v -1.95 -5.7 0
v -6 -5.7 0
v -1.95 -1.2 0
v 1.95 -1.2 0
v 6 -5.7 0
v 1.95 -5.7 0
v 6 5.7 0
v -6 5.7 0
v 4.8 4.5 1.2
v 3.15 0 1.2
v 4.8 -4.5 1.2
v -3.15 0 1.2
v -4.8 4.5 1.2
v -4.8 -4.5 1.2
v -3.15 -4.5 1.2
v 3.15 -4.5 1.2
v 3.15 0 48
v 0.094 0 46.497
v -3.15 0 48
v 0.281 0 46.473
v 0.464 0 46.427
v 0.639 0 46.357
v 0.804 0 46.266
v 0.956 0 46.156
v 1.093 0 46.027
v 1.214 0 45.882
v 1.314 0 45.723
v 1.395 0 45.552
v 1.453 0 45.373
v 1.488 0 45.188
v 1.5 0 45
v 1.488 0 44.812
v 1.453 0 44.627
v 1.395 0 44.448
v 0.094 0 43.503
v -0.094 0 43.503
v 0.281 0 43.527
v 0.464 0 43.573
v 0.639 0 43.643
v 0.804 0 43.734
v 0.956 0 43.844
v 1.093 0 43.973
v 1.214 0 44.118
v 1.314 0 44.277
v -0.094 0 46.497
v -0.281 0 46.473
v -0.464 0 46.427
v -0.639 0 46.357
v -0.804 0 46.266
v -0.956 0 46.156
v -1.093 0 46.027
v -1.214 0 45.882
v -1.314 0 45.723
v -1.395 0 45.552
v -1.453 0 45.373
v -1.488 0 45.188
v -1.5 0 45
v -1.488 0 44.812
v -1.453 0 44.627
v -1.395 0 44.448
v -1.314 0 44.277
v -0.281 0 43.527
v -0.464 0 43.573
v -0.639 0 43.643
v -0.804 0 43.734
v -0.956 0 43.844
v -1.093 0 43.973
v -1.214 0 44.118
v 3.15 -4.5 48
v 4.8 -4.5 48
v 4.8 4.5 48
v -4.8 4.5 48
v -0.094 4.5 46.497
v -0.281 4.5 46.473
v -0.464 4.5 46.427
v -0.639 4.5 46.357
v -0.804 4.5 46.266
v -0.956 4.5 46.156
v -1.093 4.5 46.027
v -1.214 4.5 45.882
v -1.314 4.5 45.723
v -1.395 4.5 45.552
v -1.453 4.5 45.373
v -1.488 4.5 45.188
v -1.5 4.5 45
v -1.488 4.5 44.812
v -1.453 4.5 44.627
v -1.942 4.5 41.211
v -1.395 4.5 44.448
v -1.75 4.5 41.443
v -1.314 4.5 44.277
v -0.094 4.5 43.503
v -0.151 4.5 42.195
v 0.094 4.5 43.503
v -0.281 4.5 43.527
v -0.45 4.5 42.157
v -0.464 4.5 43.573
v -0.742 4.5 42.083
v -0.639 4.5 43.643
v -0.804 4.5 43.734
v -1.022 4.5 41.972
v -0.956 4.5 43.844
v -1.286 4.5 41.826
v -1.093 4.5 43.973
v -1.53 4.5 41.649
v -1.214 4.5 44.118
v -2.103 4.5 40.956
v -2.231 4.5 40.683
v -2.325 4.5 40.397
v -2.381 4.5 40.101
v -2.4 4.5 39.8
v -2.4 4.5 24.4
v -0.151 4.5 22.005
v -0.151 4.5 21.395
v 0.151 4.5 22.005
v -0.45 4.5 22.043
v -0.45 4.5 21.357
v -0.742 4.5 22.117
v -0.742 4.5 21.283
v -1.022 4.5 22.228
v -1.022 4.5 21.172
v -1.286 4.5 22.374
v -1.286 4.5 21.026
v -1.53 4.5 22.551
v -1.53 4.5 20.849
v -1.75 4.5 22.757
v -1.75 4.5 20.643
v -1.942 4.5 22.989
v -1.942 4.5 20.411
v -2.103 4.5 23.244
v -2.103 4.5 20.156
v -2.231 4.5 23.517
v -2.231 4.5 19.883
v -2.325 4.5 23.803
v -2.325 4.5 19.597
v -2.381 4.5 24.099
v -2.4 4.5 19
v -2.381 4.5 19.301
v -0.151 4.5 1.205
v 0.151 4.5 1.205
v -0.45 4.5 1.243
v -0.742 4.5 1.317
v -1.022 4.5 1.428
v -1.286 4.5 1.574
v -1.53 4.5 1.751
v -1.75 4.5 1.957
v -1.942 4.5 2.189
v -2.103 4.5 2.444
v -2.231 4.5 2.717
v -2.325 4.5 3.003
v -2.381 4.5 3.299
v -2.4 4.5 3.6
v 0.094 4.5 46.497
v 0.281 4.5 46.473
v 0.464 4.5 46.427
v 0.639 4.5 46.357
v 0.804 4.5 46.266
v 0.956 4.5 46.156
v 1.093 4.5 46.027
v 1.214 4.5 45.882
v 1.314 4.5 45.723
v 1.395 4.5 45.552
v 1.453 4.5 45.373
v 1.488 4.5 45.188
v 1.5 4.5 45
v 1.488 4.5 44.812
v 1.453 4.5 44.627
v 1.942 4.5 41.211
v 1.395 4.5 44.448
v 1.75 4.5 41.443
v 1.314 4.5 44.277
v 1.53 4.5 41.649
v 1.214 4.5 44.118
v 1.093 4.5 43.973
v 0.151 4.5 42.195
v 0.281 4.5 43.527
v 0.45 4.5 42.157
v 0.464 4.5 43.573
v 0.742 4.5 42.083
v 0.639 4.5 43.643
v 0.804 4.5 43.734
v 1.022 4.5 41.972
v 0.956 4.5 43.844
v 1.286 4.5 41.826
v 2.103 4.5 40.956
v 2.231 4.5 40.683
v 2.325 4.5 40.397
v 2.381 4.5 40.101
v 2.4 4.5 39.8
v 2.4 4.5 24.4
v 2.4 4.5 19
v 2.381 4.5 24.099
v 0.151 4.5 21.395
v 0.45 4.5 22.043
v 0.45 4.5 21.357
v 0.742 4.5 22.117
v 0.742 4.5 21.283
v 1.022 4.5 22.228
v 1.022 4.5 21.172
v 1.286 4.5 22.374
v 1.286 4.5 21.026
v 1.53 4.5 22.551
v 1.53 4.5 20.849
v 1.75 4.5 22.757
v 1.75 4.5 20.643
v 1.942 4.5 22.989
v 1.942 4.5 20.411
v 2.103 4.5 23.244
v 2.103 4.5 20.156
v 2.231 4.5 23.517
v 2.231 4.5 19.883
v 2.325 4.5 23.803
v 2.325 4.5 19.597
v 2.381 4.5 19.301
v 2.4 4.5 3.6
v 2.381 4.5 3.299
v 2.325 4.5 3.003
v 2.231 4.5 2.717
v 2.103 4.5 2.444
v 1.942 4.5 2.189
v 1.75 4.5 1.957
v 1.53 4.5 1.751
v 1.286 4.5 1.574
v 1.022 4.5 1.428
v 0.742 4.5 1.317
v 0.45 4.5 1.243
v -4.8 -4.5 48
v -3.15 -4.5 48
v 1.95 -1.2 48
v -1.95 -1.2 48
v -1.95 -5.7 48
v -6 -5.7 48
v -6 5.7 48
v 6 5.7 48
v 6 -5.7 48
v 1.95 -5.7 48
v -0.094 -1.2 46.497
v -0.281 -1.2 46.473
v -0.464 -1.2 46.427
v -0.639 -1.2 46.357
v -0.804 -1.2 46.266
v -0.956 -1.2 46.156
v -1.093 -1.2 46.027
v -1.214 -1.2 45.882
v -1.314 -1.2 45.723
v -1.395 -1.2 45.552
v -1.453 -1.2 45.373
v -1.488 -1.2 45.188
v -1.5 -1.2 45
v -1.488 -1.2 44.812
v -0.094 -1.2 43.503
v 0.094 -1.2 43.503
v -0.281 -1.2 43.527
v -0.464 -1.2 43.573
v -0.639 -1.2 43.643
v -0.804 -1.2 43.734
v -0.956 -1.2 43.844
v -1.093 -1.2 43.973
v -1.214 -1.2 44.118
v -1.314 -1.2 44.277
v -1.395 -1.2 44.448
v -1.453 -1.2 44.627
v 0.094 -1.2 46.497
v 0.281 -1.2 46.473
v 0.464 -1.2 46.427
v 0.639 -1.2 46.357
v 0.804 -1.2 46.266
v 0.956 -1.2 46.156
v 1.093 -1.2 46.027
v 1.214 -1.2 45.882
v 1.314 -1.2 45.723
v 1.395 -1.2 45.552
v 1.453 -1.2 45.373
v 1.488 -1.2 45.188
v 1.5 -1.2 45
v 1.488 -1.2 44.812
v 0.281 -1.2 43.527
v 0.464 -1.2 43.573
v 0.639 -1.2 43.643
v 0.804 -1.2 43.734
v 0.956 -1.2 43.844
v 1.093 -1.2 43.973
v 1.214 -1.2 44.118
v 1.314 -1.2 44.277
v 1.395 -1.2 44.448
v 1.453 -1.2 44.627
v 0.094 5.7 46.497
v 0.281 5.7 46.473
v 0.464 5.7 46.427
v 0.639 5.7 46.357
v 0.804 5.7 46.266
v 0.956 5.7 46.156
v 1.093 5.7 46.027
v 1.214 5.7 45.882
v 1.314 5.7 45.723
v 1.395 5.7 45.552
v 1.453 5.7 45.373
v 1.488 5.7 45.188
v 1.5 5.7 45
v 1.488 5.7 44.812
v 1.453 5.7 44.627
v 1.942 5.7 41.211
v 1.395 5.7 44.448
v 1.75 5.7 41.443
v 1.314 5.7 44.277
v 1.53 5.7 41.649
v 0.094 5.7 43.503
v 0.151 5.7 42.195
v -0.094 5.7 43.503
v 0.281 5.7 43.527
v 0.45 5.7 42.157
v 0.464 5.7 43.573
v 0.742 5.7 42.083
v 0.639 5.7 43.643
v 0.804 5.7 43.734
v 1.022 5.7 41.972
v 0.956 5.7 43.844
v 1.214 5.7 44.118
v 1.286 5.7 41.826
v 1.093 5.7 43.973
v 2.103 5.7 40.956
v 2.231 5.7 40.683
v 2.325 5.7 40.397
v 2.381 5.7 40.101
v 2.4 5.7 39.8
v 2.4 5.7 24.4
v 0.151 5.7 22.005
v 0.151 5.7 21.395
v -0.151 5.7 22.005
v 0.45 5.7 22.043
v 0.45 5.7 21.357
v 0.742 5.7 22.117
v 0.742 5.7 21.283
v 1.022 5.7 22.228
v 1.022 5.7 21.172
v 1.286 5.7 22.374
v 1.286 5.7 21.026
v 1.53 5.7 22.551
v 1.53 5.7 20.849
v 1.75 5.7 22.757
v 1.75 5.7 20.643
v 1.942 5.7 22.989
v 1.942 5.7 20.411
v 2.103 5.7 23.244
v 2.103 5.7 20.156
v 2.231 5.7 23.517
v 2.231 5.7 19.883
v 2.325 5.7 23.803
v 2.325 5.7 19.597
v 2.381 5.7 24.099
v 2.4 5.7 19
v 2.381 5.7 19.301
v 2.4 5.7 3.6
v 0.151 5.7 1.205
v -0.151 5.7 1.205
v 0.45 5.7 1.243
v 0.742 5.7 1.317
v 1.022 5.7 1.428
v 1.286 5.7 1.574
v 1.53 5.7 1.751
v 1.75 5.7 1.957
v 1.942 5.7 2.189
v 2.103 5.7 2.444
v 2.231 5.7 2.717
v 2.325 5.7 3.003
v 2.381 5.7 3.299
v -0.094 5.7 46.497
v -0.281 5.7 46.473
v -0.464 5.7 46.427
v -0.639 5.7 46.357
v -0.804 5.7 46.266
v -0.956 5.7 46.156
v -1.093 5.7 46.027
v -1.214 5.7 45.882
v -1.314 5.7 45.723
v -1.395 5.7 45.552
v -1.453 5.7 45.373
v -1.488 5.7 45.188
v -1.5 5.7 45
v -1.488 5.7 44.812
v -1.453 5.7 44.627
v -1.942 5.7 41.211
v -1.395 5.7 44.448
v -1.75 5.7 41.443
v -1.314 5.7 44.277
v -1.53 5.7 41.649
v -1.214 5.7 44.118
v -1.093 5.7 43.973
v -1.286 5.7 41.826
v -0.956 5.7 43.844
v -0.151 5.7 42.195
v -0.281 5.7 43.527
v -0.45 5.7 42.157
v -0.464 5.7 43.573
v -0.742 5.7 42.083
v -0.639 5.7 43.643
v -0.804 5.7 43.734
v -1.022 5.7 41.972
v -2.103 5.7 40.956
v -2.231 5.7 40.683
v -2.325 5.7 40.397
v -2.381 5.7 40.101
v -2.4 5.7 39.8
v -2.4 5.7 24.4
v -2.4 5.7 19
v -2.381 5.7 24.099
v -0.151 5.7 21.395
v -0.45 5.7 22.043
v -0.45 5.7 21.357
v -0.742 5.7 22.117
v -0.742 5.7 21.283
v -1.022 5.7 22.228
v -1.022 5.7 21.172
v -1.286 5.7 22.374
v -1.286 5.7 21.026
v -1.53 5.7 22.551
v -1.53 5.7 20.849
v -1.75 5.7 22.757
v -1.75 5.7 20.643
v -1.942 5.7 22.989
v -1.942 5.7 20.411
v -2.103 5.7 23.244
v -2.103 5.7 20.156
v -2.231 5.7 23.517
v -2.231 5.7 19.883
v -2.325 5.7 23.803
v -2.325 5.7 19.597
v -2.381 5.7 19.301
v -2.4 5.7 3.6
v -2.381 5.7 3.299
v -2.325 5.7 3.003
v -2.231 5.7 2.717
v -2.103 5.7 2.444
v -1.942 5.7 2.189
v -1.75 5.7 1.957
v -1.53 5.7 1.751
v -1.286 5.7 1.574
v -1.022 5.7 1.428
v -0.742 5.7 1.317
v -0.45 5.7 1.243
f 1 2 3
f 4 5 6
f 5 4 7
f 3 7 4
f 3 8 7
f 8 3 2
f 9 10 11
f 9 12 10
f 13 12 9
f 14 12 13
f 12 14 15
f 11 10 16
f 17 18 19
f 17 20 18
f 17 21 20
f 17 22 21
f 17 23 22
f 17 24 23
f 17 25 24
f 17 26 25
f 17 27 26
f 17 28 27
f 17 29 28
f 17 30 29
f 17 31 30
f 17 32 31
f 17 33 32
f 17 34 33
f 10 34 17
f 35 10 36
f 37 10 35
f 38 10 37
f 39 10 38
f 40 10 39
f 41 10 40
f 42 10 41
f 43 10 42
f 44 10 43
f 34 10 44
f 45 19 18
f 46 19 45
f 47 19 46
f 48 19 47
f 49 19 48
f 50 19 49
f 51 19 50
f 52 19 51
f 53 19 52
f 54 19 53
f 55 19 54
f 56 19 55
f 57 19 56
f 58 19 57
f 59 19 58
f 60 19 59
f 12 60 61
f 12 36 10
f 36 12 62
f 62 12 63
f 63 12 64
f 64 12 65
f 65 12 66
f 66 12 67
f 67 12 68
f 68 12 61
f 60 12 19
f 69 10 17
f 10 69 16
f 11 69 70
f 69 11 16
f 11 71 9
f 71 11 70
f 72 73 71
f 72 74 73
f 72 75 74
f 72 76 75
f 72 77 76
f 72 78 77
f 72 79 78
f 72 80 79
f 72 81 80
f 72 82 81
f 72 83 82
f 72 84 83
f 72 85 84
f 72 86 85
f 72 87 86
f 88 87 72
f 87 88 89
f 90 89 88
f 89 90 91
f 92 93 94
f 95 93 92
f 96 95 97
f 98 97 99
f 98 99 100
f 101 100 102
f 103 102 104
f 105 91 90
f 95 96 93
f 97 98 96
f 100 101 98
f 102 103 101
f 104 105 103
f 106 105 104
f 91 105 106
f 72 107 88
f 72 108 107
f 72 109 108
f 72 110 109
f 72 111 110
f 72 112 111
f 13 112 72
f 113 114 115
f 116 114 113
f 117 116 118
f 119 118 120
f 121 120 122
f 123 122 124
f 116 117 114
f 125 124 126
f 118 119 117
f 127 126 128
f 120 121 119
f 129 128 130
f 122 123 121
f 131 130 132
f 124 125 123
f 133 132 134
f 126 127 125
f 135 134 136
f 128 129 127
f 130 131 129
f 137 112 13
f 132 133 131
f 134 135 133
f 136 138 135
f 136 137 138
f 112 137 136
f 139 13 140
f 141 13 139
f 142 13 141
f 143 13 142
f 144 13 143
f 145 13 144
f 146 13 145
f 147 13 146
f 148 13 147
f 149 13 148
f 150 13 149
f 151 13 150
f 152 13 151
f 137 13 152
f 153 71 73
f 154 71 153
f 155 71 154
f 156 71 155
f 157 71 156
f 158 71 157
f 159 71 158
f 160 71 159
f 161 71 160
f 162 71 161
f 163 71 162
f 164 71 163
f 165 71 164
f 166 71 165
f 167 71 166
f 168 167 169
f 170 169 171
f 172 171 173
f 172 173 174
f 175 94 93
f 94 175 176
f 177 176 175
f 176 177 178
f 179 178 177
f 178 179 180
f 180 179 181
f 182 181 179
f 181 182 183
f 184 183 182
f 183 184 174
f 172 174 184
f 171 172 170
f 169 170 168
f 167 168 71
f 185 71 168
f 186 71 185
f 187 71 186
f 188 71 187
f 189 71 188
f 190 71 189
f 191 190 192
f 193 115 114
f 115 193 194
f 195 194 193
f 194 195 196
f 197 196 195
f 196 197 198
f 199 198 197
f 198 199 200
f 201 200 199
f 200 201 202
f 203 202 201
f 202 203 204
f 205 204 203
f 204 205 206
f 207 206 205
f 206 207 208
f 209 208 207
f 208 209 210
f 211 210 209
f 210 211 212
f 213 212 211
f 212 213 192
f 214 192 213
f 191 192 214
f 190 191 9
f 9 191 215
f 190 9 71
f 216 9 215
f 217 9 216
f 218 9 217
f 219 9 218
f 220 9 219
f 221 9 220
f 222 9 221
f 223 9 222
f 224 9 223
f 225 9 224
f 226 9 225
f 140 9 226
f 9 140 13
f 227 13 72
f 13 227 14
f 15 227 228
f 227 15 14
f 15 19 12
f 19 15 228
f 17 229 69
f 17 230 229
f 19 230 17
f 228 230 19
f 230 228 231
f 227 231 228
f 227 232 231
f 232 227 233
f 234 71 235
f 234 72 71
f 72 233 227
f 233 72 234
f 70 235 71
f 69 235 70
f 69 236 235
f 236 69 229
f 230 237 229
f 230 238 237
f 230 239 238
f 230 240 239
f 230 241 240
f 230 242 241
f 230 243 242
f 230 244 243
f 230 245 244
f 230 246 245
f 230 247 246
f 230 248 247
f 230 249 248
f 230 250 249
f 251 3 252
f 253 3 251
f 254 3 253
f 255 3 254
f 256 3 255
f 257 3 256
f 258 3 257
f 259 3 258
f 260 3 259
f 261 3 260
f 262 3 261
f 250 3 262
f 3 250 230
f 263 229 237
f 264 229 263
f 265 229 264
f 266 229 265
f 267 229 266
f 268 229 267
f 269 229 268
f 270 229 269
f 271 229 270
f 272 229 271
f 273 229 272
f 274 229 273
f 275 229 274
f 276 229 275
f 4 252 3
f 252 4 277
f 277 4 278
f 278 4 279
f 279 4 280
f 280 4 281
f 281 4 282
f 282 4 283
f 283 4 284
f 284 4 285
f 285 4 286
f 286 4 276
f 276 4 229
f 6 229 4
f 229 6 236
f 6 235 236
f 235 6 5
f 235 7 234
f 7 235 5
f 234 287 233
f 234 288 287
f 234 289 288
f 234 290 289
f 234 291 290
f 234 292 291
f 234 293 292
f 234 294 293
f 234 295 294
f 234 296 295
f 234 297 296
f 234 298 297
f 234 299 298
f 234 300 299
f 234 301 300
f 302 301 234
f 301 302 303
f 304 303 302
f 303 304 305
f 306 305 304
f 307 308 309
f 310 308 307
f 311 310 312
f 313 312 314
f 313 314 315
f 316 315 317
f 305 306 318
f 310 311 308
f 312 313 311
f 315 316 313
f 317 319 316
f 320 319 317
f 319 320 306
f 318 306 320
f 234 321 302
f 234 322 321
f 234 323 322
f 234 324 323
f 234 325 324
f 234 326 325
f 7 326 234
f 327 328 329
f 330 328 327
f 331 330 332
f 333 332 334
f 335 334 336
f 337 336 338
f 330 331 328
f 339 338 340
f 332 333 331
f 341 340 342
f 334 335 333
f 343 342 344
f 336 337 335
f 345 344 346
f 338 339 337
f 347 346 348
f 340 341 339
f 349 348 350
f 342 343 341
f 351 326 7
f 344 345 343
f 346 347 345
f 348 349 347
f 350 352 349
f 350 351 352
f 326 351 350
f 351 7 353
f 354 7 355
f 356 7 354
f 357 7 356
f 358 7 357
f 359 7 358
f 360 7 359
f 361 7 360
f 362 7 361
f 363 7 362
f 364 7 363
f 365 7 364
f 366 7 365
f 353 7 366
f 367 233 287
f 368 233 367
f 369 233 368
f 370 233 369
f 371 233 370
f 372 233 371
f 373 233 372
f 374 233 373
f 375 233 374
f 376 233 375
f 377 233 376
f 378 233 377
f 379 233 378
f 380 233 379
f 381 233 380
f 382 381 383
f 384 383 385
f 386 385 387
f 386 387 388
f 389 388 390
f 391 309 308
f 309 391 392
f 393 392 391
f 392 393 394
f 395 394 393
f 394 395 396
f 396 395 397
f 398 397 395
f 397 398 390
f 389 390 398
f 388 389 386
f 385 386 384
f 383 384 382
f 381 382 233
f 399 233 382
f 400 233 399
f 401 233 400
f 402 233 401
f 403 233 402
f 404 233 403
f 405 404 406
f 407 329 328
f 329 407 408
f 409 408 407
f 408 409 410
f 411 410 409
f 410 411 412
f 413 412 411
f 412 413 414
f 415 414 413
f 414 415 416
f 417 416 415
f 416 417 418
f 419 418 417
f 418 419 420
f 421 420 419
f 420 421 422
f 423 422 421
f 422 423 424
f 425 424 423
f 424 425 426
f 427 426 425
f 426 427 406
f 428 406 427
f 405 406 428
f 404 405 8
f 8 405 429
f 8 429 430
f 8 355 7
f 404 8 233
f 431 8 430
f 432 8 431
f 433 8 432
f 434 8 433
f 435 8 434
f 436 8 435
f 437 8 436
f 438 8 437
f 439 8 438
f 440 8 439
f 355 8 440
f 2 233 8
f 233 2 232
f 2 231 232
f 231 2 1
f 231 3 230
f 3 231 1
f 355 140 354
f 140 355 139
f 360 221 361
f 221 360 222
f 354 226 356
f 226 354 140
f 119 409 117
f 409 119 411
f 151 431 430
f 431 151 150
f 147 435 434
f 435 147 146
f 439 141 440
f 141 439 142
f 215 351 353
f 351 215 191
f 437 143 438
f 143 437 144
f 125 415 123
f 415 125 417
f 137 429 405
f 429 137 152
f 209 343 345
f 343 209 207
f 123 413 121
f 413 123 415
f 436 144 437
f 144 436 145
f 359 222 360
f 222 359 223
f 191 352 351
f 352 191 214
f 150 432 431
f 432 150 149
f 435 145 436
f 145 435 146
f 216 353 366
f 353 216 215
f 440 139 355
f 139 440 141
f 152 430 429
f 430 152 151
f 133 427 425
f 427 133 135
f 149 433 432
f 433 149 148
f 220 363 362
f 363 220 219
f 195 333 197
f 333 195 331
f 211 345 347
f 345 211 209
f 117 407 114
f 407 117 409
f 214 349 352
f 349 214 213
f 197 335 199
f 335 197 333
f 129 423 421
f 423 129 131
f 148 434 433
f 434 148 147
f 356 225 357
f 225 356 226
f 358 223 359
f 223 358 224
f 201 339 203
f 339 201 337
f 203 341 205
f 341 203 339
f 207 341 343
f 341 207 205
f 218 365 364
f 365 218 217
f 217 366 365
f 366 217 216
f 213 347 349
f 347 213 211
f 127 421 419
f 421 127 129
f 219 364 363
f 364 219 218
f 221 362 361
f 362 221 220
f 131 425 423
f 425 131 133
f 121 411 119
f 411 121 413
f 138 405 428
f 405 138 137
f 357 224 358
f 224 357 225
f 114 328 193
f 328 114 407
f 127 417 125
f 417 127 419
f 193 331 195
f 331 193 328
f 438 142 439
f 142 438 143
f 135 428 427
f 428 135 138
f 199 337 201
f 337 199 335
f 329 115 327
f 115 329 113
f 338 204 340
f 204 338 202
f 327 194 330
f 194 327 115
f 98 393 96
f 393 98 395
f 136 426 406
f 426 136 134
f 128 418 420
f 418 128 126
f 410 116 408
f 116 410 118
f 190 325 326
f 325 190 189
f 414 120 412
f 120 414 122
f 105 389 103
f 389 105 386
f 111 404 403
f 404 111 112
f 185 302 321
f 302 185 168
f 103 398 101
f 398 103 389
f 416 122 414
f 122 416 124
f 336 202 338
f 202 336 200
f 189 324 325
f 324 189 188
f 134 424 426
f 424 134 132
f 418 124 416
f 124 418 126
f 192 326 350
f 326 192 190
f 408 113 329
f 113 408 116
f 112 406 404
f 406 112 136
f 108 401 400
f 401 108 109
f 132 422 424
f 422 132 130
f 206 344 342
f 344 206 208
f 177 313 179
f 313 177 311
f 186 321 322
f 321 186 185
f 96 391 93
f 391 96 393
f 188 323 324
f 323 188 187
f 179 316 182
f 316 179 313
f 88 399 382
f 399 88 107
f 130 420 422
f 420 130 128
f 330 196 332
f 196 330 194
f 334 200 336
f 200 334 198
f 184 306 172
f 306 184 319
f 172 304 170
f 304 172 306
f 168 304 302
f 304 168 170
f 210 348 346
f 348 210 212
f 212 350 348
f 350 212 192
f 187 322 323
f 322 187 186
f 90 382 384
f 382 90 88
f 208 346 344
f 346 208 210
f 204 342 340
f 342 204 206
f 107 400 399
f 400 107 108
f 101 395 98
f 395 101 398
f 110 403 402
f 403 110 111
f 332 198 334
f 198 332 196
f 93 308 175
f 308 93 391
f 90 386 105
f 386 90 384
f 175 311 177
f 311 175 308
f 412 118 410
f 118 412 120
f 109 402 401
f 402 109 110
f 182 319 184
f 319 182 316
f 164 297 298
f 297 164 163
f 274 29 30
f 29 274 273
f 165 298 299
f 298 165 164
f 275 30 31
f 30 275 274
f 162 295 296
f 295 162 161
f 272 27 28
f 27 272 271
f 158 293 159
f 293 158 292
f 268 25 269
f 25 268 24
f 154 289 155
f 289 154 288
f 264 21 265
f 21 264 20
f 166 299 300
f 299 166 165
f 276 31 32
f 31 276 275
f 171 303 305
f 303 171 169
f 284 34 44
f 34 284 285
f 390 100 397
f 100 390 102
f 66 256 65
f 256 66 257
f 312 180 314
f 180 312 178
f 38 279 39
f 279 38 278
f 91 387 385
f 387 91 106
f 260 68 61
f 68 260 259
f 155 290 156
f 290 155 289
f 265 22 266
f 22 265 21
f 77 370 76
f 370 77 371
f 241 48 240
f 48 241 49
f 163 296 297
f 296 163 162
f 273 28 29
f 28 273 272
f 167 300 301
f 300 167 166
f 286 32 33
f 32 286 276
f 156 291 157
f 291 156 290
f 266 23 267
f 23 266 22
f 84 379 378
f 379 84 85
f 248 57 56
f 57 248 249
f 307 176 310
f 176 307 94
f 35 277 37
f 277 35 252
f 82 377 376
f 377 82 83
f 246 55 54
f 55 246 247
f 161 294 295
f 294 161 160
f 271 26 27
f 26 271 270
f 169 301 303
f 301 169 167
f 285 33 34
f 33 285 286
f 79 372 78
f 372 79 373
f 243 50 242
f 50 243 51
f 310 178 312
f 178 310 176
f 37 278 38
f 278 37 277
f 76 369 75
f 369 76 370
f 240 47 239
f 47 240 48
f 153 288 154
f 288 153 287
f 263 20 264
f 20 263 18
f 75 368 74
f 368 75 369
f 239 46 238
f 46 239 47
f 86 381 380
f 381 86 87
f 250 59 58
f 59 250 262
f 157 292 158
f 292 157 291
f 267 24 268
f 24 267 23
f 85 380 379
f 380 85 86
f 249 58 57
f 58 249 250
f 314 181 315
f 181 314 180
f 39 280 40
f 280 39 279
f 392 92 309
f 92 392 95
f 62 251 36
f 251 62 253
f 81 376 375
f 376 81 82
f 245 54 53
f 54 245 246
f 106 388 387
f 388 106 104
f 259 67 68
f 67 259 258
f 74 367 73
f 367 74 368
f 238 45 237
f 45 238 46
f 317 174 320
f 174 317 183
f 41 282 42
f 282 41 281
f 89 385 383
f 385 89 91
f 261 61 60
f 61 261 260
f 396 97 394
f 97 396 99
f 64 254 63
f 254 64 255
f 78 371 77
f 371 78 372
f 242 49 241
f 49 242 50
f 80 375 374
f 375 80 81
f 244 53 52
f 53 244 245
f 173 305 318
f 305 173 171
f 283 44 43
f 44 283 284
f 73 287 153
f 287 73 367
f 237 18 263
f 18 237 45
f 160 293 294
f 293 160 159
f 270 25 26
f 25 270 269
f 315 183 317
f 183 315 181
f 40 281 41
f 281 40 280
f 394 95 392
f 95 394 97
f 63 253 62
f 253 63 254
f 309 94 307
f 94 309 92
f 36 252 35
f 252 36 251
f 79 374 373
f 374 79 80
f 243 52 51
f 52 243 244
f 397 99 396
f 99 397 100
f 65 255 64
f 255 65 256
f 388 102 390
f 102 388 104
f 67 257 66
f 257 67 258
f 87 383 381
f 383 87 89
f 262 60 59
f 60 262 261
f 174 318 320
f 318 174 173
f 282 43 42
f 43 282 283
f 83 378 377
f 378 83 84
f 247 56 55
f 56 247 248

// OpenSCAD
/*
 * Soporte para almacenar circuitos integrados.
 *
 * @author  Joaquín Fernández
 * @url     http://www.thingiverse.com/joaquinfq/
 * @license CC
 *
 ***********************************************
 *
 * Esquema de algunas variables:
 *
 *    |----w1----|
 *     __________
 *    |          |
 * h1 |          | 
 *    |   ____   |
 *    |  |    |  |
 * h2 |  |    |  |
 *    |__|-w2-|__|
 */
function roundToLayerHeight(value) = ceil(value / lh) * lh;
// Layer Height
lh = 0.3;
// Altura.
l  = roundToLayerHeight(48);
// Altura del cuerpo del IC
h1 = roundToLayerHeight(4.5);
// Altura de las patas del IC
h2 = roundToLayerHeight(4.5);
// Anchura externa
w1 = roundToLayerHeight(9.5);
// Anchura interna.
w2 = roundToLayerHeight(w1 - 3.5);
// Diámetro del pin, M3 por defecto.
d  = 3;
// Grosor de las paredes
f  = 4 * lh;
// Indica si se agregan las ranuras en la parte superior
addSlots = true;
//---------------------------------
// Calculamos las rutas a dibujar.
//---------------------------------
path = [
    [ - w1 / 2, - h2 ],
    [ - w1 / 2,   h1 ],
    [   w1 / 2,   h1 ],
    [   w1 / 2, - h2 ],
    [   w2 / 2, - h2 ],
    [   w2 / 2,    0 ],
    [ - w2 / 2,    0 ],
    [ - w2 / 2, - h2 ]
];
/**
 * Dibuja el soporte.
 */
module holder()
    {
    difference()
    {
        union()
        {
            linear_extrude(f)
            {
                polygon(path);
            }
            linear_extrude(l)
            {
                difference()
                {
                    offset(delta = f)
                    {
                        polygon(path);
                    }
                    polygon(path);
                }
            }
        }
        if (addSlots)
        {
            maxLength = l - roundToLayerHeight(d);
            slots     = ceil(maxLength / 30);
            sl        = floor(maxLength / slots);
            for (i = [ 0 : slots - 1 ])
            {
                translate([ 0, 0, (sl - f) * i + f ])
                {
                    slot(sl - (slots == 1 ? 3 * f : 1.5 * f));
                }
            }
        }
        translate([ 0, h1 + f + lh, l - d ])
        {
            rotate([ 90, 0, 0 ])
            {
                difference()
                {
                    pin();
                }
            }
        }
    }
}
/**
 * Dibuja el pin para evitar que se salgan los ICs.
 *
 * @param {Number} tolerance Valor a usar para modificar las
 *                           dimensiones del pin y dejar holgura.
 */
module pin(tolerance = 0)
{
    _d  = d + tolerance;
    _dm = _d + 2 * f;
    _dx = _dm / 2 - _d * 0.25;
    difference()
    {
        union()
        {
            translate([ 0, 0, - f / 2 - lh ])
            {
                cylinder(d = _dm, h = f);
            }
            cylinder(d = _d, h = h1 + 2.5 * f);
            translate([ 0, 0, h1 + 2.5 * f + _d / 2 ])
            {
                scale([ 1.2, 1.2, 1.75 ])
                {
                    sphere(d = _d);
                }
            }
        }
    }
}
/**
 * Dibuja las ranuras de la parte superior para ver el código del IC.
 *
 * @param {Number} length Longitud del slot.
 */
module slot(length)
{
    _d = w1 - 4 * f;
    _y = roundToLayerHeight(_d / 2);
    rotate([ 90, 0, 0 ])
    {
        hull()
        {
            for (_i = [ -1, 1 ])
            {
                translate([ 0, _i == -1 ? length - _y : _y, - h1 - f ])
                {
                    cylinder(d = _d, h = h1);
                }
            }
        }
    }
}
//---------------------------------------------------
$fn = 50;
holder();
// Quitamos 2 layerHeights para tener holgura.
//pin(- 2 * lh);
